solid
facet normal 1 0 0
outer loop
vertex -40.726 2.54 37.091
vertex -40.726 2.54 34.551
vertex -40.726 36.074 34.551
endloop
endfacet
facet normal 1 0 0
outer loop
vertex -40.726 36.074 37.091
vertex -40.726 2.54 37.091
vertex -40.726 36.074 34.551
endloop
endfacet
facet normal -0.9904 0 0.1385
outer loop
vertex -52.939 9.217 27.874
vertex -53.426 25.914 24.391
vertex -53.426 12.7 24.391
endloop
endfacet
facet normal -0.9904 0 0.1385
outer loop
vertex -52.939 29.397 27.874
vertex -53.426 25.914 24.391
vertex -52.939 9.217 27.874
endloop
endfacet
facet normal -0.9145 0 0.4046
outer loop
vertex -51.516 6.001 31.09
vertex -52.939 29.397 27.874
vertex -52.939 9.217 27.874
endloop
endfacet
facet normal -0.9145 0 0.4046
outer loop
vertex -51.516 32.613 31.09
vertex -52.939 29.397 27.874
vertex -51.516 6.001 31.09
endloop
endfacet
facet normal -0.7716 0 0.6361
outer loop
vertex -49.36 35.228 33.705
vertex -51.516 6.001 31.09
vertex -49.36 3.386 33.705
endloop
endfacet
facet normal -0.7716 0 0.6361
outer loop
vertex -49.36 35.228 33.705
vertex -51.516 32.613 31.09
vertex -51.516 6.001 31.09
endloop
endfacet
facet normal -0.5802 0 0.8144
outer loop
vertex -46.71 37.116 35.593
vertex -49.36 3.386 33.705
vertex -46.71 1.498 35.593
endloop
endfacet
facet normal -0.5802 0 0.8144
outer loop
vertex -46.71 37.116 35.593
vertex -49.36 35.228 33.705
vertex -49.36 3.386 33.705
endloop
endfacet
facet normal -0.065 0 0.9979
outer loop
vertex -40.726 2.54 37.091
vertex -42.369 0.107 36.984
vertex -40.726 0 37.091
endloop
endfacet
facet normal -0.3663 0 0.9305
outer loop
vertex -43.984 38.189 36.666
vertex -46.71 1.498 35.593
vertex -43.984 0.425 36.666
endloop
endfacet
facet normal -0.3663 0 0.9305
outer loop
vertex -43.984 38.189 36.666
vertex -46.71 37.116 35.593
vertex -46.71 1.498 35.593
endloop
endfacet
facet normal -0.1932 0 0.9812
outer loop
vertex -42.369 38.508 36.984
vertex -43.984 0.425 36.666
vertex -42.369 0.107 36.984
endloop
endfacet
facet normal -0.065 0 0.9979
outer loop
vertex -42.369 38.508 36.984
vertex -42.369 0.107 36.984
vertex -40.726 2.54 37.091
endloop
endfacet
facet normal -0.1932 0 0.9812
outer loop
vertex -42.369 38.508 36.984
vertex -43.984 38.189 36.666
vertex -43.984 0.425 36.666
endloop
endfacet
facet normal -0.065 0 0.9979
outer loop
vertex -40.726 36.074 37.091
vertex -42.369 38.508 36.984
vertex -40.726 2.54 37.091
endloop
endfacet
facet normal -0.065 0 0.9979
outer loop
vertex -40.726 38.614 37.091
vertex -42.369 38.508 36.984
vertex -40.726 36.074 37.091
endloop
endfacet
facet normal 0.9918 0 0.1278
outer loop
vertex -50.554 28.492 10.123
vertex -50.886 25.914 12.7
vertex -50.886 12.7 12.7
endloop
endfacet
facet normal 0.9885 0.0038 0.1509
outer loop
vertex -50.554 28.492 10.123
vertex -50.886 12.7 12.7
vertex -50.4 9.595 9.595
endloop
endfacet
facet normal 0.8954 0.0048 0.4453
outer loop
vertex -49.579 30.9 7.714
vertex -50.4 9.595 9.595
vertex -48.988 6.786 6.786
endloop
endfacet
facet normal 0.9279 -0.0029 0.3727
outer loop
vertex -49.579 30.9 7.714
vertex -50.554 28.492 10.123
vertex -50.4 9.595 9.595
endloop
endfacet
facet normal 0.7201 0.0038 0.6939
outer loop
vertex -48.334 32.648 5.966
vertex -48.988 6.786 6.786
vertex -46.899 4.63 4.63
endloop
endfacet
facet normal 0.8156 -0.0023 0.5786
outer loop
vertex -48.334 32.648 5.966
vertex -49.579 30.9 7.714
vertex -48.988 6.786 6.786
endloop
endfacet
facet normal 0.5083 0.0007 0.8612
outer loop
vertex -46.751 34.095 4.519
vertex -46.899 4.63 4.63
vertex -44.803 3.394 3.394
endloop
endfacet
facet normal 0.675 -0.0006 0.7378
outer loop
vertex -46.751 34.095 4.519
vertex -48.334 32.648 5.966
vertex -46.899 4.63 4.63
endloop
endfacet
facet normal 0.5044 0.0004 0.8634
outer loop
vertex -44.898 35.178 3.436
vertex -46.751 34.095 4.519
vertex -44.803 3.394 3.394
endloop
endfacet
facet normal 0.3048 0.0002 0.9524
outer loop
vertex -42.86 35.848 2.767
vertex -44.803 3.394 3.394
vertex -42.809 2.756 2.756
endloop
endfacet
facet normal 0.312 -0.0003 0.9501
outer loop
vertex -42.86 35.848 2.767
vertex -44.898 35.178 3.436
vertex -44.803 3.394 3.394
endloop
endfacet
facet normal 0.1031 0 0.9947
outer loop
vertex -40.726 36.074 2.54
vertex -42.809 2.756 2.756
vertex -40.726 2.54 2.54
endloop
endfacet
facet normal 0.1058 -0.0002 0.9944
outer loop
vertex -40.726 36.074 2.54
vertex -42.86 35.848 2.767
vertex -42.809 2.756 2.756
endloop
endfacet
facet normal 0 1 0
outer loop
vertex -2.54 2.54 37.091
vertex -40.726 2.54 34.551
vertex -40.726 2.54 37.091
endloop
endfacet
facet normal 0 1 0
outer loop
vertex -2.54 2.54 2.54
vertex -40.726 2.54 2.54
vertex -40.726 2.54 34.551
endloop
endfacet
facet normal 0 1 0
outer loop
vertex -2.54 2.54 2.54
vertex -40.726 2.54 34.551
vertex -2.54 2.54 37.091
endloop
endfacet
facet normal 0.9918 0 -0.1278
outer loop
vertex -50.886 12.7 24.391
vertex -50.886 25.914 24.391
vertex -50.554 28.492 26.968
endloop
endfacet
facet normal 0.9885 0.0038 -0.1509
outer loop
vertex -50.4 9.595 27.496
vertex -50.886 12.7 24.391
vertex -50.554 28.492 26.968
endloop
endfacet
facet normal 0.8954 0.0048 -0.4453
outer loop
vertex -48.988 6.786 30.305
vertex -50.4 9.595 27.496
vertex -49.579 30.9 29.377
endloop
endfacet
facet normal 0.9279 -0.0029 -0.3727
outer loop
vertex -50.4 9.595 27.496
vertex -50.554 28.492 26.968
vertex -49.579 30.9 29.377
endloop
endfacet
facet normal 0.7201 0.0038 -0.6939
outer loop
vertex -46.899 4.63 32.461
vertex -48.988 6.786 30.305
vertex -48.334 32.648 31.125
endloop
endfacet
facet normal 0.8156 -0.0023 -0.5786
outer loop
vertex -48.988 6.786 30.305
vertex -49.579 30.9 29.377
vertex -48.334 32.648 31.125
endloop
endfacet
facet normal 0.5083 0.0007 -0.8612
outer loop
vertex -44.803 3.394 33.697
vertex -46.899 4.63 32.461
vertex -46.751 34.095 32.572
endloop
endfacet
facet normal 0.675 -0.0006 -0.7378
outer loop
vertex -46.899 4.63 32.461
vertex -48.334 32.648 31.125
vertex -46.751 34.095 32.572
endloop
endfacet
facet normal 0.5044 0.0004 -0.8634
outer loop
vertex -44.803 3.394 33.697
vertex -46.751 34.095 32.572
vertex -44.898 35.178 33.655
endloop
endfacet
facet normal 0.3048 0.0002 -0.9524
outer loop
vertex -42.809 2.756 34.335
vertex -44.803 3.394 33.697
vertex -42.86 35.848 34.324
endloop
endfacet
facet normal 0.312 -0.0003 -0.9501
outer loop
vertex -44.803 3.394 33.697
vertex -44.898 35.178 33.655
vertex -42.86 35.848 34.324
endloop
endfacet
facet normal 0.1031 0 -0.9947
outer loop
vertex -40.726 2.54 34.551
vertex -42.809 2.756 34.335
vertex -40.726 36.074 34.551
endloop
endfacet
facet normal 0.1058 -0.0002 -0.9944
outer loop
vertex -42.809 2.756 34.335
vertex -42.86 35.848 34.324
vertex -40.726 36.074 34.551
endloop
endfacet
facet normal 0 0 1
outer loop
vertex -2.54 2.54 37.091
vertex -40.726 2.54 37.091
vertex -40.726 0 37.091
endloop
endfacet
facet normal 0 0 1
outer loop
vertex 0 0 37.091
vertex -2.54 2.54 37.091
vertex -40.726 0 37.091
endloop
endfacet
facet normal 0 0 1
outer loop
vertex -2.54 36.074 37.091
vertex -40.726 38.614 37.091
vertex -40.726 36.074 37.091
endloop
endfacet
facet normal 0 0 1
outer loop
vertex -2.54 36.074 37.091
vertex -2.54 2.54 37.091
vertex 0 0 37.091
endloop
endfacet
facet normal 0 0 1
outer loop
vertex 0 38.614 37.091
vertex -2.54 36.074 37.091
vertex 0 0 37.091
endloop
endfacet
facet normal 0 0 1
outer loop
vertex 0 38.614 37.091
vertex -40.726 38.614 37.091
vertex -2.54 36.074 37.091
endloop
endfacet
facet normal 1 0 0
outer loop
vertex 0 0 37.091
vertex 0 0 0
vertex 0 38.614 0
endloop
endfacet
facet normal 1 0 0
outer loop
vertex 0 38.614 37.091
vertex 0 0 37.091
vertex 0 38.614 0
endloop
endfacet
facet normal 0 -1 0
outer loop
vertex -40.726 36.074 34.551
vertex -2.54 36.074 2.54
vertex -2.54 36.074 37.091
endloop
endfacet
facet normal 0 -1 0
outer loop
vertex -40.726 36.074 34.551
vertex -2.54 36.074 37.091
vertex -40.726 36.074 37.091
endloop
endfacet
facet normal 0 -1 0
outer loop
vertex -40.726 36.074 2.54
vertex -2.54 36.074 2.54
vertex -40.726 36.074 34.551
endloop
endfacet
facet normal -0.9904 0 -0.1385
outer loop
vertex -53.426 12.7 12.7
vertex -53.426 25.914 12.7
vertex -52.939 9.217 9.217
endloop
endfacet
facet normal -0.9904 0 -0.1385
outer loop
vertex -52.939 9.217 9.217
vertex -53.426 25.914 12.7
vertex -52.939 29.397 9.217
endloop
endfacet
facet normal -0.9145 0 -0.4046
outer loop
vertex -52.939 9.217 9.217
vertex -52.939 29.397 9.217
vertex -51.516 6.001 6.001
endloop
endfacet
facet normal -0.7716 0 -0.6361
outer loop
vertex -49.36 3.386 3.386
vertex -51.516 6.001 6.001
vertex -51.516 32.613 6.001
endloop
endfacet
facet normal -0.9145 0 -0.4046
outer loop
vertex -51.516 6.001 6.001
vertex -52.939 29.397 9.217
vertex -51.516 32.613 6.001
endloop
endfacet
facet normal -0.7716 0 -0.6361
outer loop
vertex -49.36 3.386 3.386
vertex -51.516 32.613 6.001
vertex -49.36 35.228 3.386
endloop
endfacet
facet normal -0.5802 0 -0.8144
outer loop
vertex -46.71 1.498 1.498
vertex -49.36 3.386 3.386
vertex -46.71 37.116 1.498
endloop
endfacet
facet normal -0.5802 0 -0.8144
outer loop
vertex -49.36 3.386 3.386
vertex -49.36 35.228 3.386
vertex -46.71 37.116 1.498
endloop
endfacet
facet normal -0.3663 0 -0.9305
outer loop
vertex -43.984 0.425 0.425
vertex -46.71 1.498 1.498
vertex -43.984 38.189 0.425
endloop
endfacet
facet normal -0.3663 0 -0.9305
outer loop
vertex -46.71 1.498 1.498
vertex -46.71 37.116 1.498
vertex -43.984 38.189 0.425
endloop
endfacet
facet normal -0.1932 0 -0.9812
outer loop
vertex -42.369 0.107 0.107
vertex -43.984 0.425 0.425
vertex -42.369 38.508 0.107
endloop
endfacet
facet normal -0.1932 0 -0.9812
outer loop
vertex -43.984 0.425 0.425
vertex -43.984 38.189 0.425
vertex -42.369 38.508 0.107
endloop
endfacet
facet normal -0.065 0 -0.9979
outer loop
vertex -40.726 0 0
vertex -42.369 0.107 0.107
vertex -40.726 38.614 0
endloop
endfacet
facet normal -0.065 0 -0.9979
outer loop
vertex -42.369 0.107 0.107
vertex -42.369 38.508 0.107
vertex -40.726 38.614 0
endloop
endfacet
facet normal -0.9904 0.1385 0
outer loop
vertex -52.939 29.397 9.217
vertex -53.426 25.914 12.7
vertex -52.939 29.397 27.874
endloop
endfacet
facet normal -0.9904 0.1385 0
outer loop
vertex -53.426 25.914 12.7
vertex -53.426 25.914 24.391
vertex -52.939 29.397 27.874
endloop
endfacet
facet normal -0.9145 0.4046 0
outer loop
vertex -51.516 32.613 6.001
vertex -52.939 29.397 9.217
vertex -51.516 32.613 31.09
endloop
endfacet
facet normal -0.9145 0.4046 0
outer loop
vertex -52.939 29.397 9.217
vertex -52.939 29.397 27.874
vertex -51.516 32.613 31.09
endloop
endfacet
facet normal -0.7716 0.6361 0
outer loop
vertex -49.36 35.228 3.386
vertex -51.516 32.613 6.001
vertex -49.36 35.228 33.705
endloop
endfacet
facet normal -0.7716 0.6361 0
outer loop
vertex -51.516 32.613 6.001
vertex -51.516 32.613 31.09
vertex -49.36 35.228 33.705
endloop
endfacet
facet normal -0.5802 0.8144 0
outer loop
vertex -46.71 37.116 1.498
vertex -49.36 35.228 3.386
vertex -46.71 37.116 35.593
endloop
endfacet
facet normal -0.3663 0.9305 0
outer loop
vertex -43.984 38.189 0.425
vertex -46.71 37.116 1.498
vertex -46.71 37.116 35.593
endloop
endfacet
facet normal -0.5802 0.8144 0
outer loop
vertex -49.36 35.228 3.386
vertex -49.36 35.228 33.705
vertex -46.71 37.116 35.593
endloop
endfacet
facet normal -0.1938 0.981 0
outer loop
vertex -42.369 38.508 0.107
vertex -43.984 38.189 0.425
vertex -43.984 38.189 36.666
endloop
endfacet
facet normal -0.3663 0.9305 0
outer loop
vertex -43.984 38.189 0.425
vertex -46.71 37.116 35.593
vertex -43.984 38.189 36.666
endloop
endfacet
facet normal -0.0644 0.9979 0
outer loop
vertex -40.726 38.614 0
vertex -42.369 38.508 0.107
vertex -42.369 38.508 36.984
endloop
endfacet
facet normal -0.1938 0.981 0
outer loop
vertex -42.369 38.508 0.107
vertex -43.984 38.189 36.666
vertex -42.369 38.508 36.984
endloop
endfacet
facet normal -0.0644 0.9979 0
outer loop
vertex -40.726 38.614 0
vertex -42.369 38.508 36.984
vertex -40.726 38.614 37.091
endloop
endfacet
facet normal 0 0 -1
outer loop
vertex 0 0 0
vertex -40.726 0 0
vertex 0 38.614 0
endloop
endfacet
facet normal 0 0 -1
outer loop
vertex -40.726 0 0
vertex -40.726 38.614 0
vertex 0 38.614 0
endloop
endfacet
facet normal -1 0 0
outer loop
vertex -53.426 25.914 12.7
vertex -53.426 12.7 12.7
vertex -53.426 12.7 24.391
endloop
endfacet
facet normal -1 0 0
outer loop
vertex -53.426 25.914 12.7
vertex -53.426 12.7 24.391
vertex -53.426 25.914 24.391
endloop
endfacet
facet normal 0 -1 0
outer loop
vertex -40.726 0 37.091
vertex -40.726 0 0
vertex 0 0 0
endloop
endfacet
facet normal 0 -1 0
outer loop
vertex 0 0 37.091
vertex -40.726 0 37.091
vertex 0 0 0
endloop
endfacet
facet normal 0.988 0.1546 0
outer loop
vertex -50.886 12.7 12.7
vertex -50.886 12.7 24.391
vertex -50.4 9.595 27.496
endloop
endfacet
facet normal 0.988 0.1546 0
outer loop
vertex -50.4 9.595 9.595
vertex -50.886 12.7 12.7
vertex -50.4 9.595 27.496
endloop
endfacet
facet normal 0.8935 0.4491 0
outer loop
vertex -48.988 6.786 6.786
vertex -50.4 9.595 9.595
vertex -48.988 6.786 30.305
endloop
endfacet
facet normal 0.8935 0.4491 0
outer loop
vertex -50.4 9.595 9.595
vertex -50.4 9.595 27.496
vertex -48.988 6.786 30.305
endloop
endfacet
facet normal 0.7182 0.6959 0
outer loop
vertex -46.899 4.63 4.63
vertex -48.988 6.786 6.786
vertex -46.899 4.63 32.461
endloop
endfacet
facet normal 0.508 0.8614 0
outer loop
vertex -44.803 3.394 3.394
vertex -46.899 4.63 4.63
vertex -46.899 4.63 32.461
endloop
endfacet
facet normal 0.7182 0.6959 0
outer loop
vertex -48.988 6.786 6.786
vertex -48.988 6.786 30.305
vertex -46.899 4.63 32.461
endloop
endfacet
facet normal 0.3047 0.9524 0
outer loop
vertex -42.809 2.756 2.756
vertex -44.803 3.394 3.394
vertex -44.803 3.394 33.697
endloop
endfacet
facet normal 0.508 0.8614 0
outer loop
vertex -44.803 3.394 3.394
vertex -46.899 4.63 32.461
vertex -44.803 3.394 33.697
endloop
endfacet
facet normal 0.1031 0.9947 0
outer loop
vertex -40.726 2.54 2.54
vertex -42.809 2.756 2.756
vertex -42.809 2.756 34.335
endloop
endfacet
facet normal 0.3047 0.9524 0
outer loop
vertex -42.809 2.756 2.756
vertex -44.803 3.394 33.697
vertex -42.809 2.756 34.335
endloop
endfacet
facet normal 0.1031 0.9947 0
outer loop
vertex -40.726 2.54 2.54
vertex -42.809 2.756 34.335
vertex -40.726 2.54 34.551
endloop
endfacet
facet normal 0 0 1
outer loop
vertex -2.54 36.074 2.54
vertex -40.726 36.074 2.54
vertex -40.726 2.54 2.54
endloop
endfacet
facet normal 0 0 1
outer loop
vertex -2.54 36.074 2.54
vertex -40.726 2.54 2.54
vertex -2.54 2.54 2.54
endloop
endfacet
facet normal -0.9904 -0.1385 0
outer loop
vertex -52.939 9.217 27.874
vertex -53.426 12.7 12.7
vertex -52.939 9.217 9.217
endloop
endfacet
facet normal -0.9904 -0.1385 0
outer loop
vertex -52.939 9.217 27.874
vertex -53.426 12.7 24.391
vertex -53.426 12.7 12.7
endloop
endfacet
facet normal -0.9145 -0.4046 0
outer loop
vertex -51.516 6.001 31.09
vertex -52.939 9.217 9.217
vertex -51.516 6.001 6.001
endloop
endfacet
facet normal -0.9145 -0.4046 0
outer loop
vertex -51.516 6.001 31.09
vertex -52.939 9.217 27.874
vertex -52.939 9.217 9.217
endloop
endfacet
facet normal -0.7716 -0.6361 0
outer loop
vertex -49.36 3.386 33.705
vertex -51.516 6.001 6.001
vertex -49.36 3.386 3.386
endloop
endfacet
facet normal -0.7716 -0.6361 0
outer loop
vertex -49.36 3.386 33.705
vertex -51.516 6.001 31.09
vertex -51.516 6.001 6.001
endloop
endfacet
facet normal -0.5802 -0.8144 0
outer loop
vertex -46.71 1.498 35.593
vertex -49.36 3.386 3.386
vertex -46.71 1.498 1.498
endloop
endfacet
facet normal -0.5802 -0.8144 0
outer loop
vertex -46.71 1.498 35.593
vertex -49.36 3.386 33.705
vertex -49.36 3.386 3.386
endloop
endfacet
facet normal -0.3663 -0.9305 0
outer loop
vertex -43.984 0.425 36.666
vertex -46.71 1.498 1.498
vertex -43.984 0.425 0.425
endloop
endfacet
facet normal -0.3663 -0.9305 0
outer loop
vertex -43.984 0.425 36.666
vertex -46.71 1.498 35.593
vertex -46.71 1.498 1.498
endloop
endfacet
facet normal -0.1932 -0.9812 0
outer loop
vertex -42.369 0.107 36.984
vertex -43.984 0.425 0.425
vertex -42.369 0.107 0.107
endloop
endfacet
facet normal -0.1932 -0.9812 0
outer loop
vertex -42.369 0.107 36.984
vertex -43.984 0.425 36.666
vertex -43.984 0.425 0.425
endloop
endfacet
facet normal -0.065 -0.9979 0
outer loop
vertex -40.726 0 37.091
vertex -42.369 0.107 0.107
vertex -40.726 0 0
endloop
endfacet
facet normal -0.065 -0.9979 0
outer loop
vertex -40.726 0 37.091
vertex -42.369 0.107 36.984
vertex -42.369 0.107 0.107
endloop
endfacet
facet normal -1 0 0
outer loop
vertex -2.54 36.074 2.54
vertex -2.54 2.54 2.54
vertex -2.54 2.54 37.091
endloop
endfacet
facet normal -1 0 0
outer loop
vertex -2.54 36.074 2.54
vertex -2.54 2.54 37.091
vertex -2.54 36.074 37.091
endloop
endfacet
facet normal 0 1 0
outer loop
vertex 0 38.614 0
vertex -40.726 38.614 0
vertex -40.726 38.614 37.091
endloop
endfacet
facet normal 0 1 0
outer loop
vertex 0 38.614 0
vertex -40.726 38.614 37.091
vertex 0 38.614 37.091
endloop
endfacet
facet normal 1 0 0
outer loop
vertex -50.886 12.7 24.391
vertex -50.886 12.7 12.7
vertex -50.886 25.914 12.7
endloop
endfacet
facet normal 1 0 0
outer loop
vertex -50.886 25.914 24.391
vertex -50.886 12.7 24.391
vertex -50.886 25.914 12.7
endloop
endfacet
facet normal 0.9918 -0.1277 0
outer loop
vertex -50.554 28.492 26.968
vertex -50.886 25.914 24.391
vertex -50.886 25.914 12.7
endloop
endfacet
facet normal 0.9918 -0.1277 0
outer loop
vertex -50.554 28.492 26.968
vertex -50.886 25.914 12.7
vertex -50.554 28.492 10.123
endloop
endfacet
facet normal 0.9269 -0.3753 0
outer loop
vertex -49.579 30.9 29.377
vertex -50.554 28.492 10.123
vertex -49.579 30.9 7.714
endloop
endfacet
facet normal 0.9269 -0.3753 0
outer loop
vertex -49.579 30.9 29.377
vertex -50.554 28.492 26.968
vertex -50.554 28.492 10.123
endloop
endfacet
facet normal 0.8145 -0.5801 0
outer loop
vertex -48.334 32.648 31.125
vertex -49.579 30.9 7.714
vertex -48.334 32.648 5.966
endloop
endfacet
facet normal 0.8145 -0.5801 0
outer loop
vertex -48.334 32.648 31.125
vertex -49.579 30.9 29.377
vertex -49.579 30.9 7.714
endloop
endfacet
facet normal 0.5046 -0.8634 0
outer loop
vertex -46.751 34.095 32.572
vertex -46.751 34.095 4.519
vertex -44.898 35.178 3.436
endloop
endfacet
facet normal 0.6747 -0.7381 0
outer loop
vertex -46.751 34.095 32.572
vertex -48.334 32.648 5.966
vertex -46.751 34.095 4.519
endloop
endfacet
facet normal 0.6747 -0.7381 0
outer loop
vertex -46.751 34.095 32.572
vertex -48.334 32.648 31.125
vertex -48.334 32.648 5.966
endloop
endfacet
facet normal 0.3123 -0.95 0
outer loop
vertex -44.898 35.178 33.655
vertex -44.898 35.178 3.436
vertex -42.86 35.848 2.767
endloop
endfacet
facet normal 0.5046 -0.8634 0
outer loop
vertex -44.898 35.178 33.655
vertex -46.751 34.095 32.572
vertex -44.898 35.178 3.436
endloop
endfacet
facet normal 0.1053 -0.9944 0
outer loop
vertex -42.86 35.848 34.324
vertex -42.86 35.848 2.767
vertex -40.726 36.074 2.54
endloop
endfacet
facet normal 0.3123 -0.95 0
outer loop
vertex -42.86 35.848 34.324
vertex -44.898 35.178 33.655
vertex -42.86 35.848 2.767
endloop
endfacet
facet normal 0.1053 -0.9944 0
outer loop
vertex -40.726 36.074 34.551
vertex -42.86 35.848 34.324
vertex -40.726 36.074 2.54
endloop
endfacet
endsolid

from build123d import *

# Parameters (mm, degrees)
F0_W     = 53.4262955189
F0_H     = 38.6142134666
F1_DEPTH = 37.0909944177
F2_R     = 12.7
F3_T     = -2.54


# Not quite as in the source:
# - a shell that OpenCascade refuses in one call is made with other operations: the cavity is built on its own and cut out


with BuildPart() as f1:
    # F0 (on Top) → F1 (new body)
    with BuildSketch(Plane.XY):
        with Locations((-26.7131477594, 19.3071067333)):
            Rectangle(F0_W, F0_H)
    extrude(amount=F1_DEPTH)

    # F2
    f2_edges = [f1.edges().sort_by_distance(p)[0] for p in [
        (-53.426296, 38.614213, 18.545497),
        (-53.426296, 0, 18.545497),
        (-53.426296, 19.307107, 0),
        (-53.426296, 19.307107, 37.090994),
    ]]
    fillet(f2_edges, radius=F2_R)

    # F3: a shell. OpenCascade refuses it in one call, so the cavity is built on its own and cut out:
    # the body offset inwards by the wall thickness, plus a prism from it out through each open face.
    f3_core = offset(f1.part, amount=F3_T, mode=Mode.PRIVATE)
    f3_exits = [f3_core.faces().sort_by_distance(p)[0] for p in [
        (-21.633148, 19.307107, 34.550994),
    ]]
    add(f3_core, mode=Mode.SUBTRACT)
    extrude(f3_exits, amount=-F3_T, mode=Mode.SUBTRACT)


solid = f1.part
